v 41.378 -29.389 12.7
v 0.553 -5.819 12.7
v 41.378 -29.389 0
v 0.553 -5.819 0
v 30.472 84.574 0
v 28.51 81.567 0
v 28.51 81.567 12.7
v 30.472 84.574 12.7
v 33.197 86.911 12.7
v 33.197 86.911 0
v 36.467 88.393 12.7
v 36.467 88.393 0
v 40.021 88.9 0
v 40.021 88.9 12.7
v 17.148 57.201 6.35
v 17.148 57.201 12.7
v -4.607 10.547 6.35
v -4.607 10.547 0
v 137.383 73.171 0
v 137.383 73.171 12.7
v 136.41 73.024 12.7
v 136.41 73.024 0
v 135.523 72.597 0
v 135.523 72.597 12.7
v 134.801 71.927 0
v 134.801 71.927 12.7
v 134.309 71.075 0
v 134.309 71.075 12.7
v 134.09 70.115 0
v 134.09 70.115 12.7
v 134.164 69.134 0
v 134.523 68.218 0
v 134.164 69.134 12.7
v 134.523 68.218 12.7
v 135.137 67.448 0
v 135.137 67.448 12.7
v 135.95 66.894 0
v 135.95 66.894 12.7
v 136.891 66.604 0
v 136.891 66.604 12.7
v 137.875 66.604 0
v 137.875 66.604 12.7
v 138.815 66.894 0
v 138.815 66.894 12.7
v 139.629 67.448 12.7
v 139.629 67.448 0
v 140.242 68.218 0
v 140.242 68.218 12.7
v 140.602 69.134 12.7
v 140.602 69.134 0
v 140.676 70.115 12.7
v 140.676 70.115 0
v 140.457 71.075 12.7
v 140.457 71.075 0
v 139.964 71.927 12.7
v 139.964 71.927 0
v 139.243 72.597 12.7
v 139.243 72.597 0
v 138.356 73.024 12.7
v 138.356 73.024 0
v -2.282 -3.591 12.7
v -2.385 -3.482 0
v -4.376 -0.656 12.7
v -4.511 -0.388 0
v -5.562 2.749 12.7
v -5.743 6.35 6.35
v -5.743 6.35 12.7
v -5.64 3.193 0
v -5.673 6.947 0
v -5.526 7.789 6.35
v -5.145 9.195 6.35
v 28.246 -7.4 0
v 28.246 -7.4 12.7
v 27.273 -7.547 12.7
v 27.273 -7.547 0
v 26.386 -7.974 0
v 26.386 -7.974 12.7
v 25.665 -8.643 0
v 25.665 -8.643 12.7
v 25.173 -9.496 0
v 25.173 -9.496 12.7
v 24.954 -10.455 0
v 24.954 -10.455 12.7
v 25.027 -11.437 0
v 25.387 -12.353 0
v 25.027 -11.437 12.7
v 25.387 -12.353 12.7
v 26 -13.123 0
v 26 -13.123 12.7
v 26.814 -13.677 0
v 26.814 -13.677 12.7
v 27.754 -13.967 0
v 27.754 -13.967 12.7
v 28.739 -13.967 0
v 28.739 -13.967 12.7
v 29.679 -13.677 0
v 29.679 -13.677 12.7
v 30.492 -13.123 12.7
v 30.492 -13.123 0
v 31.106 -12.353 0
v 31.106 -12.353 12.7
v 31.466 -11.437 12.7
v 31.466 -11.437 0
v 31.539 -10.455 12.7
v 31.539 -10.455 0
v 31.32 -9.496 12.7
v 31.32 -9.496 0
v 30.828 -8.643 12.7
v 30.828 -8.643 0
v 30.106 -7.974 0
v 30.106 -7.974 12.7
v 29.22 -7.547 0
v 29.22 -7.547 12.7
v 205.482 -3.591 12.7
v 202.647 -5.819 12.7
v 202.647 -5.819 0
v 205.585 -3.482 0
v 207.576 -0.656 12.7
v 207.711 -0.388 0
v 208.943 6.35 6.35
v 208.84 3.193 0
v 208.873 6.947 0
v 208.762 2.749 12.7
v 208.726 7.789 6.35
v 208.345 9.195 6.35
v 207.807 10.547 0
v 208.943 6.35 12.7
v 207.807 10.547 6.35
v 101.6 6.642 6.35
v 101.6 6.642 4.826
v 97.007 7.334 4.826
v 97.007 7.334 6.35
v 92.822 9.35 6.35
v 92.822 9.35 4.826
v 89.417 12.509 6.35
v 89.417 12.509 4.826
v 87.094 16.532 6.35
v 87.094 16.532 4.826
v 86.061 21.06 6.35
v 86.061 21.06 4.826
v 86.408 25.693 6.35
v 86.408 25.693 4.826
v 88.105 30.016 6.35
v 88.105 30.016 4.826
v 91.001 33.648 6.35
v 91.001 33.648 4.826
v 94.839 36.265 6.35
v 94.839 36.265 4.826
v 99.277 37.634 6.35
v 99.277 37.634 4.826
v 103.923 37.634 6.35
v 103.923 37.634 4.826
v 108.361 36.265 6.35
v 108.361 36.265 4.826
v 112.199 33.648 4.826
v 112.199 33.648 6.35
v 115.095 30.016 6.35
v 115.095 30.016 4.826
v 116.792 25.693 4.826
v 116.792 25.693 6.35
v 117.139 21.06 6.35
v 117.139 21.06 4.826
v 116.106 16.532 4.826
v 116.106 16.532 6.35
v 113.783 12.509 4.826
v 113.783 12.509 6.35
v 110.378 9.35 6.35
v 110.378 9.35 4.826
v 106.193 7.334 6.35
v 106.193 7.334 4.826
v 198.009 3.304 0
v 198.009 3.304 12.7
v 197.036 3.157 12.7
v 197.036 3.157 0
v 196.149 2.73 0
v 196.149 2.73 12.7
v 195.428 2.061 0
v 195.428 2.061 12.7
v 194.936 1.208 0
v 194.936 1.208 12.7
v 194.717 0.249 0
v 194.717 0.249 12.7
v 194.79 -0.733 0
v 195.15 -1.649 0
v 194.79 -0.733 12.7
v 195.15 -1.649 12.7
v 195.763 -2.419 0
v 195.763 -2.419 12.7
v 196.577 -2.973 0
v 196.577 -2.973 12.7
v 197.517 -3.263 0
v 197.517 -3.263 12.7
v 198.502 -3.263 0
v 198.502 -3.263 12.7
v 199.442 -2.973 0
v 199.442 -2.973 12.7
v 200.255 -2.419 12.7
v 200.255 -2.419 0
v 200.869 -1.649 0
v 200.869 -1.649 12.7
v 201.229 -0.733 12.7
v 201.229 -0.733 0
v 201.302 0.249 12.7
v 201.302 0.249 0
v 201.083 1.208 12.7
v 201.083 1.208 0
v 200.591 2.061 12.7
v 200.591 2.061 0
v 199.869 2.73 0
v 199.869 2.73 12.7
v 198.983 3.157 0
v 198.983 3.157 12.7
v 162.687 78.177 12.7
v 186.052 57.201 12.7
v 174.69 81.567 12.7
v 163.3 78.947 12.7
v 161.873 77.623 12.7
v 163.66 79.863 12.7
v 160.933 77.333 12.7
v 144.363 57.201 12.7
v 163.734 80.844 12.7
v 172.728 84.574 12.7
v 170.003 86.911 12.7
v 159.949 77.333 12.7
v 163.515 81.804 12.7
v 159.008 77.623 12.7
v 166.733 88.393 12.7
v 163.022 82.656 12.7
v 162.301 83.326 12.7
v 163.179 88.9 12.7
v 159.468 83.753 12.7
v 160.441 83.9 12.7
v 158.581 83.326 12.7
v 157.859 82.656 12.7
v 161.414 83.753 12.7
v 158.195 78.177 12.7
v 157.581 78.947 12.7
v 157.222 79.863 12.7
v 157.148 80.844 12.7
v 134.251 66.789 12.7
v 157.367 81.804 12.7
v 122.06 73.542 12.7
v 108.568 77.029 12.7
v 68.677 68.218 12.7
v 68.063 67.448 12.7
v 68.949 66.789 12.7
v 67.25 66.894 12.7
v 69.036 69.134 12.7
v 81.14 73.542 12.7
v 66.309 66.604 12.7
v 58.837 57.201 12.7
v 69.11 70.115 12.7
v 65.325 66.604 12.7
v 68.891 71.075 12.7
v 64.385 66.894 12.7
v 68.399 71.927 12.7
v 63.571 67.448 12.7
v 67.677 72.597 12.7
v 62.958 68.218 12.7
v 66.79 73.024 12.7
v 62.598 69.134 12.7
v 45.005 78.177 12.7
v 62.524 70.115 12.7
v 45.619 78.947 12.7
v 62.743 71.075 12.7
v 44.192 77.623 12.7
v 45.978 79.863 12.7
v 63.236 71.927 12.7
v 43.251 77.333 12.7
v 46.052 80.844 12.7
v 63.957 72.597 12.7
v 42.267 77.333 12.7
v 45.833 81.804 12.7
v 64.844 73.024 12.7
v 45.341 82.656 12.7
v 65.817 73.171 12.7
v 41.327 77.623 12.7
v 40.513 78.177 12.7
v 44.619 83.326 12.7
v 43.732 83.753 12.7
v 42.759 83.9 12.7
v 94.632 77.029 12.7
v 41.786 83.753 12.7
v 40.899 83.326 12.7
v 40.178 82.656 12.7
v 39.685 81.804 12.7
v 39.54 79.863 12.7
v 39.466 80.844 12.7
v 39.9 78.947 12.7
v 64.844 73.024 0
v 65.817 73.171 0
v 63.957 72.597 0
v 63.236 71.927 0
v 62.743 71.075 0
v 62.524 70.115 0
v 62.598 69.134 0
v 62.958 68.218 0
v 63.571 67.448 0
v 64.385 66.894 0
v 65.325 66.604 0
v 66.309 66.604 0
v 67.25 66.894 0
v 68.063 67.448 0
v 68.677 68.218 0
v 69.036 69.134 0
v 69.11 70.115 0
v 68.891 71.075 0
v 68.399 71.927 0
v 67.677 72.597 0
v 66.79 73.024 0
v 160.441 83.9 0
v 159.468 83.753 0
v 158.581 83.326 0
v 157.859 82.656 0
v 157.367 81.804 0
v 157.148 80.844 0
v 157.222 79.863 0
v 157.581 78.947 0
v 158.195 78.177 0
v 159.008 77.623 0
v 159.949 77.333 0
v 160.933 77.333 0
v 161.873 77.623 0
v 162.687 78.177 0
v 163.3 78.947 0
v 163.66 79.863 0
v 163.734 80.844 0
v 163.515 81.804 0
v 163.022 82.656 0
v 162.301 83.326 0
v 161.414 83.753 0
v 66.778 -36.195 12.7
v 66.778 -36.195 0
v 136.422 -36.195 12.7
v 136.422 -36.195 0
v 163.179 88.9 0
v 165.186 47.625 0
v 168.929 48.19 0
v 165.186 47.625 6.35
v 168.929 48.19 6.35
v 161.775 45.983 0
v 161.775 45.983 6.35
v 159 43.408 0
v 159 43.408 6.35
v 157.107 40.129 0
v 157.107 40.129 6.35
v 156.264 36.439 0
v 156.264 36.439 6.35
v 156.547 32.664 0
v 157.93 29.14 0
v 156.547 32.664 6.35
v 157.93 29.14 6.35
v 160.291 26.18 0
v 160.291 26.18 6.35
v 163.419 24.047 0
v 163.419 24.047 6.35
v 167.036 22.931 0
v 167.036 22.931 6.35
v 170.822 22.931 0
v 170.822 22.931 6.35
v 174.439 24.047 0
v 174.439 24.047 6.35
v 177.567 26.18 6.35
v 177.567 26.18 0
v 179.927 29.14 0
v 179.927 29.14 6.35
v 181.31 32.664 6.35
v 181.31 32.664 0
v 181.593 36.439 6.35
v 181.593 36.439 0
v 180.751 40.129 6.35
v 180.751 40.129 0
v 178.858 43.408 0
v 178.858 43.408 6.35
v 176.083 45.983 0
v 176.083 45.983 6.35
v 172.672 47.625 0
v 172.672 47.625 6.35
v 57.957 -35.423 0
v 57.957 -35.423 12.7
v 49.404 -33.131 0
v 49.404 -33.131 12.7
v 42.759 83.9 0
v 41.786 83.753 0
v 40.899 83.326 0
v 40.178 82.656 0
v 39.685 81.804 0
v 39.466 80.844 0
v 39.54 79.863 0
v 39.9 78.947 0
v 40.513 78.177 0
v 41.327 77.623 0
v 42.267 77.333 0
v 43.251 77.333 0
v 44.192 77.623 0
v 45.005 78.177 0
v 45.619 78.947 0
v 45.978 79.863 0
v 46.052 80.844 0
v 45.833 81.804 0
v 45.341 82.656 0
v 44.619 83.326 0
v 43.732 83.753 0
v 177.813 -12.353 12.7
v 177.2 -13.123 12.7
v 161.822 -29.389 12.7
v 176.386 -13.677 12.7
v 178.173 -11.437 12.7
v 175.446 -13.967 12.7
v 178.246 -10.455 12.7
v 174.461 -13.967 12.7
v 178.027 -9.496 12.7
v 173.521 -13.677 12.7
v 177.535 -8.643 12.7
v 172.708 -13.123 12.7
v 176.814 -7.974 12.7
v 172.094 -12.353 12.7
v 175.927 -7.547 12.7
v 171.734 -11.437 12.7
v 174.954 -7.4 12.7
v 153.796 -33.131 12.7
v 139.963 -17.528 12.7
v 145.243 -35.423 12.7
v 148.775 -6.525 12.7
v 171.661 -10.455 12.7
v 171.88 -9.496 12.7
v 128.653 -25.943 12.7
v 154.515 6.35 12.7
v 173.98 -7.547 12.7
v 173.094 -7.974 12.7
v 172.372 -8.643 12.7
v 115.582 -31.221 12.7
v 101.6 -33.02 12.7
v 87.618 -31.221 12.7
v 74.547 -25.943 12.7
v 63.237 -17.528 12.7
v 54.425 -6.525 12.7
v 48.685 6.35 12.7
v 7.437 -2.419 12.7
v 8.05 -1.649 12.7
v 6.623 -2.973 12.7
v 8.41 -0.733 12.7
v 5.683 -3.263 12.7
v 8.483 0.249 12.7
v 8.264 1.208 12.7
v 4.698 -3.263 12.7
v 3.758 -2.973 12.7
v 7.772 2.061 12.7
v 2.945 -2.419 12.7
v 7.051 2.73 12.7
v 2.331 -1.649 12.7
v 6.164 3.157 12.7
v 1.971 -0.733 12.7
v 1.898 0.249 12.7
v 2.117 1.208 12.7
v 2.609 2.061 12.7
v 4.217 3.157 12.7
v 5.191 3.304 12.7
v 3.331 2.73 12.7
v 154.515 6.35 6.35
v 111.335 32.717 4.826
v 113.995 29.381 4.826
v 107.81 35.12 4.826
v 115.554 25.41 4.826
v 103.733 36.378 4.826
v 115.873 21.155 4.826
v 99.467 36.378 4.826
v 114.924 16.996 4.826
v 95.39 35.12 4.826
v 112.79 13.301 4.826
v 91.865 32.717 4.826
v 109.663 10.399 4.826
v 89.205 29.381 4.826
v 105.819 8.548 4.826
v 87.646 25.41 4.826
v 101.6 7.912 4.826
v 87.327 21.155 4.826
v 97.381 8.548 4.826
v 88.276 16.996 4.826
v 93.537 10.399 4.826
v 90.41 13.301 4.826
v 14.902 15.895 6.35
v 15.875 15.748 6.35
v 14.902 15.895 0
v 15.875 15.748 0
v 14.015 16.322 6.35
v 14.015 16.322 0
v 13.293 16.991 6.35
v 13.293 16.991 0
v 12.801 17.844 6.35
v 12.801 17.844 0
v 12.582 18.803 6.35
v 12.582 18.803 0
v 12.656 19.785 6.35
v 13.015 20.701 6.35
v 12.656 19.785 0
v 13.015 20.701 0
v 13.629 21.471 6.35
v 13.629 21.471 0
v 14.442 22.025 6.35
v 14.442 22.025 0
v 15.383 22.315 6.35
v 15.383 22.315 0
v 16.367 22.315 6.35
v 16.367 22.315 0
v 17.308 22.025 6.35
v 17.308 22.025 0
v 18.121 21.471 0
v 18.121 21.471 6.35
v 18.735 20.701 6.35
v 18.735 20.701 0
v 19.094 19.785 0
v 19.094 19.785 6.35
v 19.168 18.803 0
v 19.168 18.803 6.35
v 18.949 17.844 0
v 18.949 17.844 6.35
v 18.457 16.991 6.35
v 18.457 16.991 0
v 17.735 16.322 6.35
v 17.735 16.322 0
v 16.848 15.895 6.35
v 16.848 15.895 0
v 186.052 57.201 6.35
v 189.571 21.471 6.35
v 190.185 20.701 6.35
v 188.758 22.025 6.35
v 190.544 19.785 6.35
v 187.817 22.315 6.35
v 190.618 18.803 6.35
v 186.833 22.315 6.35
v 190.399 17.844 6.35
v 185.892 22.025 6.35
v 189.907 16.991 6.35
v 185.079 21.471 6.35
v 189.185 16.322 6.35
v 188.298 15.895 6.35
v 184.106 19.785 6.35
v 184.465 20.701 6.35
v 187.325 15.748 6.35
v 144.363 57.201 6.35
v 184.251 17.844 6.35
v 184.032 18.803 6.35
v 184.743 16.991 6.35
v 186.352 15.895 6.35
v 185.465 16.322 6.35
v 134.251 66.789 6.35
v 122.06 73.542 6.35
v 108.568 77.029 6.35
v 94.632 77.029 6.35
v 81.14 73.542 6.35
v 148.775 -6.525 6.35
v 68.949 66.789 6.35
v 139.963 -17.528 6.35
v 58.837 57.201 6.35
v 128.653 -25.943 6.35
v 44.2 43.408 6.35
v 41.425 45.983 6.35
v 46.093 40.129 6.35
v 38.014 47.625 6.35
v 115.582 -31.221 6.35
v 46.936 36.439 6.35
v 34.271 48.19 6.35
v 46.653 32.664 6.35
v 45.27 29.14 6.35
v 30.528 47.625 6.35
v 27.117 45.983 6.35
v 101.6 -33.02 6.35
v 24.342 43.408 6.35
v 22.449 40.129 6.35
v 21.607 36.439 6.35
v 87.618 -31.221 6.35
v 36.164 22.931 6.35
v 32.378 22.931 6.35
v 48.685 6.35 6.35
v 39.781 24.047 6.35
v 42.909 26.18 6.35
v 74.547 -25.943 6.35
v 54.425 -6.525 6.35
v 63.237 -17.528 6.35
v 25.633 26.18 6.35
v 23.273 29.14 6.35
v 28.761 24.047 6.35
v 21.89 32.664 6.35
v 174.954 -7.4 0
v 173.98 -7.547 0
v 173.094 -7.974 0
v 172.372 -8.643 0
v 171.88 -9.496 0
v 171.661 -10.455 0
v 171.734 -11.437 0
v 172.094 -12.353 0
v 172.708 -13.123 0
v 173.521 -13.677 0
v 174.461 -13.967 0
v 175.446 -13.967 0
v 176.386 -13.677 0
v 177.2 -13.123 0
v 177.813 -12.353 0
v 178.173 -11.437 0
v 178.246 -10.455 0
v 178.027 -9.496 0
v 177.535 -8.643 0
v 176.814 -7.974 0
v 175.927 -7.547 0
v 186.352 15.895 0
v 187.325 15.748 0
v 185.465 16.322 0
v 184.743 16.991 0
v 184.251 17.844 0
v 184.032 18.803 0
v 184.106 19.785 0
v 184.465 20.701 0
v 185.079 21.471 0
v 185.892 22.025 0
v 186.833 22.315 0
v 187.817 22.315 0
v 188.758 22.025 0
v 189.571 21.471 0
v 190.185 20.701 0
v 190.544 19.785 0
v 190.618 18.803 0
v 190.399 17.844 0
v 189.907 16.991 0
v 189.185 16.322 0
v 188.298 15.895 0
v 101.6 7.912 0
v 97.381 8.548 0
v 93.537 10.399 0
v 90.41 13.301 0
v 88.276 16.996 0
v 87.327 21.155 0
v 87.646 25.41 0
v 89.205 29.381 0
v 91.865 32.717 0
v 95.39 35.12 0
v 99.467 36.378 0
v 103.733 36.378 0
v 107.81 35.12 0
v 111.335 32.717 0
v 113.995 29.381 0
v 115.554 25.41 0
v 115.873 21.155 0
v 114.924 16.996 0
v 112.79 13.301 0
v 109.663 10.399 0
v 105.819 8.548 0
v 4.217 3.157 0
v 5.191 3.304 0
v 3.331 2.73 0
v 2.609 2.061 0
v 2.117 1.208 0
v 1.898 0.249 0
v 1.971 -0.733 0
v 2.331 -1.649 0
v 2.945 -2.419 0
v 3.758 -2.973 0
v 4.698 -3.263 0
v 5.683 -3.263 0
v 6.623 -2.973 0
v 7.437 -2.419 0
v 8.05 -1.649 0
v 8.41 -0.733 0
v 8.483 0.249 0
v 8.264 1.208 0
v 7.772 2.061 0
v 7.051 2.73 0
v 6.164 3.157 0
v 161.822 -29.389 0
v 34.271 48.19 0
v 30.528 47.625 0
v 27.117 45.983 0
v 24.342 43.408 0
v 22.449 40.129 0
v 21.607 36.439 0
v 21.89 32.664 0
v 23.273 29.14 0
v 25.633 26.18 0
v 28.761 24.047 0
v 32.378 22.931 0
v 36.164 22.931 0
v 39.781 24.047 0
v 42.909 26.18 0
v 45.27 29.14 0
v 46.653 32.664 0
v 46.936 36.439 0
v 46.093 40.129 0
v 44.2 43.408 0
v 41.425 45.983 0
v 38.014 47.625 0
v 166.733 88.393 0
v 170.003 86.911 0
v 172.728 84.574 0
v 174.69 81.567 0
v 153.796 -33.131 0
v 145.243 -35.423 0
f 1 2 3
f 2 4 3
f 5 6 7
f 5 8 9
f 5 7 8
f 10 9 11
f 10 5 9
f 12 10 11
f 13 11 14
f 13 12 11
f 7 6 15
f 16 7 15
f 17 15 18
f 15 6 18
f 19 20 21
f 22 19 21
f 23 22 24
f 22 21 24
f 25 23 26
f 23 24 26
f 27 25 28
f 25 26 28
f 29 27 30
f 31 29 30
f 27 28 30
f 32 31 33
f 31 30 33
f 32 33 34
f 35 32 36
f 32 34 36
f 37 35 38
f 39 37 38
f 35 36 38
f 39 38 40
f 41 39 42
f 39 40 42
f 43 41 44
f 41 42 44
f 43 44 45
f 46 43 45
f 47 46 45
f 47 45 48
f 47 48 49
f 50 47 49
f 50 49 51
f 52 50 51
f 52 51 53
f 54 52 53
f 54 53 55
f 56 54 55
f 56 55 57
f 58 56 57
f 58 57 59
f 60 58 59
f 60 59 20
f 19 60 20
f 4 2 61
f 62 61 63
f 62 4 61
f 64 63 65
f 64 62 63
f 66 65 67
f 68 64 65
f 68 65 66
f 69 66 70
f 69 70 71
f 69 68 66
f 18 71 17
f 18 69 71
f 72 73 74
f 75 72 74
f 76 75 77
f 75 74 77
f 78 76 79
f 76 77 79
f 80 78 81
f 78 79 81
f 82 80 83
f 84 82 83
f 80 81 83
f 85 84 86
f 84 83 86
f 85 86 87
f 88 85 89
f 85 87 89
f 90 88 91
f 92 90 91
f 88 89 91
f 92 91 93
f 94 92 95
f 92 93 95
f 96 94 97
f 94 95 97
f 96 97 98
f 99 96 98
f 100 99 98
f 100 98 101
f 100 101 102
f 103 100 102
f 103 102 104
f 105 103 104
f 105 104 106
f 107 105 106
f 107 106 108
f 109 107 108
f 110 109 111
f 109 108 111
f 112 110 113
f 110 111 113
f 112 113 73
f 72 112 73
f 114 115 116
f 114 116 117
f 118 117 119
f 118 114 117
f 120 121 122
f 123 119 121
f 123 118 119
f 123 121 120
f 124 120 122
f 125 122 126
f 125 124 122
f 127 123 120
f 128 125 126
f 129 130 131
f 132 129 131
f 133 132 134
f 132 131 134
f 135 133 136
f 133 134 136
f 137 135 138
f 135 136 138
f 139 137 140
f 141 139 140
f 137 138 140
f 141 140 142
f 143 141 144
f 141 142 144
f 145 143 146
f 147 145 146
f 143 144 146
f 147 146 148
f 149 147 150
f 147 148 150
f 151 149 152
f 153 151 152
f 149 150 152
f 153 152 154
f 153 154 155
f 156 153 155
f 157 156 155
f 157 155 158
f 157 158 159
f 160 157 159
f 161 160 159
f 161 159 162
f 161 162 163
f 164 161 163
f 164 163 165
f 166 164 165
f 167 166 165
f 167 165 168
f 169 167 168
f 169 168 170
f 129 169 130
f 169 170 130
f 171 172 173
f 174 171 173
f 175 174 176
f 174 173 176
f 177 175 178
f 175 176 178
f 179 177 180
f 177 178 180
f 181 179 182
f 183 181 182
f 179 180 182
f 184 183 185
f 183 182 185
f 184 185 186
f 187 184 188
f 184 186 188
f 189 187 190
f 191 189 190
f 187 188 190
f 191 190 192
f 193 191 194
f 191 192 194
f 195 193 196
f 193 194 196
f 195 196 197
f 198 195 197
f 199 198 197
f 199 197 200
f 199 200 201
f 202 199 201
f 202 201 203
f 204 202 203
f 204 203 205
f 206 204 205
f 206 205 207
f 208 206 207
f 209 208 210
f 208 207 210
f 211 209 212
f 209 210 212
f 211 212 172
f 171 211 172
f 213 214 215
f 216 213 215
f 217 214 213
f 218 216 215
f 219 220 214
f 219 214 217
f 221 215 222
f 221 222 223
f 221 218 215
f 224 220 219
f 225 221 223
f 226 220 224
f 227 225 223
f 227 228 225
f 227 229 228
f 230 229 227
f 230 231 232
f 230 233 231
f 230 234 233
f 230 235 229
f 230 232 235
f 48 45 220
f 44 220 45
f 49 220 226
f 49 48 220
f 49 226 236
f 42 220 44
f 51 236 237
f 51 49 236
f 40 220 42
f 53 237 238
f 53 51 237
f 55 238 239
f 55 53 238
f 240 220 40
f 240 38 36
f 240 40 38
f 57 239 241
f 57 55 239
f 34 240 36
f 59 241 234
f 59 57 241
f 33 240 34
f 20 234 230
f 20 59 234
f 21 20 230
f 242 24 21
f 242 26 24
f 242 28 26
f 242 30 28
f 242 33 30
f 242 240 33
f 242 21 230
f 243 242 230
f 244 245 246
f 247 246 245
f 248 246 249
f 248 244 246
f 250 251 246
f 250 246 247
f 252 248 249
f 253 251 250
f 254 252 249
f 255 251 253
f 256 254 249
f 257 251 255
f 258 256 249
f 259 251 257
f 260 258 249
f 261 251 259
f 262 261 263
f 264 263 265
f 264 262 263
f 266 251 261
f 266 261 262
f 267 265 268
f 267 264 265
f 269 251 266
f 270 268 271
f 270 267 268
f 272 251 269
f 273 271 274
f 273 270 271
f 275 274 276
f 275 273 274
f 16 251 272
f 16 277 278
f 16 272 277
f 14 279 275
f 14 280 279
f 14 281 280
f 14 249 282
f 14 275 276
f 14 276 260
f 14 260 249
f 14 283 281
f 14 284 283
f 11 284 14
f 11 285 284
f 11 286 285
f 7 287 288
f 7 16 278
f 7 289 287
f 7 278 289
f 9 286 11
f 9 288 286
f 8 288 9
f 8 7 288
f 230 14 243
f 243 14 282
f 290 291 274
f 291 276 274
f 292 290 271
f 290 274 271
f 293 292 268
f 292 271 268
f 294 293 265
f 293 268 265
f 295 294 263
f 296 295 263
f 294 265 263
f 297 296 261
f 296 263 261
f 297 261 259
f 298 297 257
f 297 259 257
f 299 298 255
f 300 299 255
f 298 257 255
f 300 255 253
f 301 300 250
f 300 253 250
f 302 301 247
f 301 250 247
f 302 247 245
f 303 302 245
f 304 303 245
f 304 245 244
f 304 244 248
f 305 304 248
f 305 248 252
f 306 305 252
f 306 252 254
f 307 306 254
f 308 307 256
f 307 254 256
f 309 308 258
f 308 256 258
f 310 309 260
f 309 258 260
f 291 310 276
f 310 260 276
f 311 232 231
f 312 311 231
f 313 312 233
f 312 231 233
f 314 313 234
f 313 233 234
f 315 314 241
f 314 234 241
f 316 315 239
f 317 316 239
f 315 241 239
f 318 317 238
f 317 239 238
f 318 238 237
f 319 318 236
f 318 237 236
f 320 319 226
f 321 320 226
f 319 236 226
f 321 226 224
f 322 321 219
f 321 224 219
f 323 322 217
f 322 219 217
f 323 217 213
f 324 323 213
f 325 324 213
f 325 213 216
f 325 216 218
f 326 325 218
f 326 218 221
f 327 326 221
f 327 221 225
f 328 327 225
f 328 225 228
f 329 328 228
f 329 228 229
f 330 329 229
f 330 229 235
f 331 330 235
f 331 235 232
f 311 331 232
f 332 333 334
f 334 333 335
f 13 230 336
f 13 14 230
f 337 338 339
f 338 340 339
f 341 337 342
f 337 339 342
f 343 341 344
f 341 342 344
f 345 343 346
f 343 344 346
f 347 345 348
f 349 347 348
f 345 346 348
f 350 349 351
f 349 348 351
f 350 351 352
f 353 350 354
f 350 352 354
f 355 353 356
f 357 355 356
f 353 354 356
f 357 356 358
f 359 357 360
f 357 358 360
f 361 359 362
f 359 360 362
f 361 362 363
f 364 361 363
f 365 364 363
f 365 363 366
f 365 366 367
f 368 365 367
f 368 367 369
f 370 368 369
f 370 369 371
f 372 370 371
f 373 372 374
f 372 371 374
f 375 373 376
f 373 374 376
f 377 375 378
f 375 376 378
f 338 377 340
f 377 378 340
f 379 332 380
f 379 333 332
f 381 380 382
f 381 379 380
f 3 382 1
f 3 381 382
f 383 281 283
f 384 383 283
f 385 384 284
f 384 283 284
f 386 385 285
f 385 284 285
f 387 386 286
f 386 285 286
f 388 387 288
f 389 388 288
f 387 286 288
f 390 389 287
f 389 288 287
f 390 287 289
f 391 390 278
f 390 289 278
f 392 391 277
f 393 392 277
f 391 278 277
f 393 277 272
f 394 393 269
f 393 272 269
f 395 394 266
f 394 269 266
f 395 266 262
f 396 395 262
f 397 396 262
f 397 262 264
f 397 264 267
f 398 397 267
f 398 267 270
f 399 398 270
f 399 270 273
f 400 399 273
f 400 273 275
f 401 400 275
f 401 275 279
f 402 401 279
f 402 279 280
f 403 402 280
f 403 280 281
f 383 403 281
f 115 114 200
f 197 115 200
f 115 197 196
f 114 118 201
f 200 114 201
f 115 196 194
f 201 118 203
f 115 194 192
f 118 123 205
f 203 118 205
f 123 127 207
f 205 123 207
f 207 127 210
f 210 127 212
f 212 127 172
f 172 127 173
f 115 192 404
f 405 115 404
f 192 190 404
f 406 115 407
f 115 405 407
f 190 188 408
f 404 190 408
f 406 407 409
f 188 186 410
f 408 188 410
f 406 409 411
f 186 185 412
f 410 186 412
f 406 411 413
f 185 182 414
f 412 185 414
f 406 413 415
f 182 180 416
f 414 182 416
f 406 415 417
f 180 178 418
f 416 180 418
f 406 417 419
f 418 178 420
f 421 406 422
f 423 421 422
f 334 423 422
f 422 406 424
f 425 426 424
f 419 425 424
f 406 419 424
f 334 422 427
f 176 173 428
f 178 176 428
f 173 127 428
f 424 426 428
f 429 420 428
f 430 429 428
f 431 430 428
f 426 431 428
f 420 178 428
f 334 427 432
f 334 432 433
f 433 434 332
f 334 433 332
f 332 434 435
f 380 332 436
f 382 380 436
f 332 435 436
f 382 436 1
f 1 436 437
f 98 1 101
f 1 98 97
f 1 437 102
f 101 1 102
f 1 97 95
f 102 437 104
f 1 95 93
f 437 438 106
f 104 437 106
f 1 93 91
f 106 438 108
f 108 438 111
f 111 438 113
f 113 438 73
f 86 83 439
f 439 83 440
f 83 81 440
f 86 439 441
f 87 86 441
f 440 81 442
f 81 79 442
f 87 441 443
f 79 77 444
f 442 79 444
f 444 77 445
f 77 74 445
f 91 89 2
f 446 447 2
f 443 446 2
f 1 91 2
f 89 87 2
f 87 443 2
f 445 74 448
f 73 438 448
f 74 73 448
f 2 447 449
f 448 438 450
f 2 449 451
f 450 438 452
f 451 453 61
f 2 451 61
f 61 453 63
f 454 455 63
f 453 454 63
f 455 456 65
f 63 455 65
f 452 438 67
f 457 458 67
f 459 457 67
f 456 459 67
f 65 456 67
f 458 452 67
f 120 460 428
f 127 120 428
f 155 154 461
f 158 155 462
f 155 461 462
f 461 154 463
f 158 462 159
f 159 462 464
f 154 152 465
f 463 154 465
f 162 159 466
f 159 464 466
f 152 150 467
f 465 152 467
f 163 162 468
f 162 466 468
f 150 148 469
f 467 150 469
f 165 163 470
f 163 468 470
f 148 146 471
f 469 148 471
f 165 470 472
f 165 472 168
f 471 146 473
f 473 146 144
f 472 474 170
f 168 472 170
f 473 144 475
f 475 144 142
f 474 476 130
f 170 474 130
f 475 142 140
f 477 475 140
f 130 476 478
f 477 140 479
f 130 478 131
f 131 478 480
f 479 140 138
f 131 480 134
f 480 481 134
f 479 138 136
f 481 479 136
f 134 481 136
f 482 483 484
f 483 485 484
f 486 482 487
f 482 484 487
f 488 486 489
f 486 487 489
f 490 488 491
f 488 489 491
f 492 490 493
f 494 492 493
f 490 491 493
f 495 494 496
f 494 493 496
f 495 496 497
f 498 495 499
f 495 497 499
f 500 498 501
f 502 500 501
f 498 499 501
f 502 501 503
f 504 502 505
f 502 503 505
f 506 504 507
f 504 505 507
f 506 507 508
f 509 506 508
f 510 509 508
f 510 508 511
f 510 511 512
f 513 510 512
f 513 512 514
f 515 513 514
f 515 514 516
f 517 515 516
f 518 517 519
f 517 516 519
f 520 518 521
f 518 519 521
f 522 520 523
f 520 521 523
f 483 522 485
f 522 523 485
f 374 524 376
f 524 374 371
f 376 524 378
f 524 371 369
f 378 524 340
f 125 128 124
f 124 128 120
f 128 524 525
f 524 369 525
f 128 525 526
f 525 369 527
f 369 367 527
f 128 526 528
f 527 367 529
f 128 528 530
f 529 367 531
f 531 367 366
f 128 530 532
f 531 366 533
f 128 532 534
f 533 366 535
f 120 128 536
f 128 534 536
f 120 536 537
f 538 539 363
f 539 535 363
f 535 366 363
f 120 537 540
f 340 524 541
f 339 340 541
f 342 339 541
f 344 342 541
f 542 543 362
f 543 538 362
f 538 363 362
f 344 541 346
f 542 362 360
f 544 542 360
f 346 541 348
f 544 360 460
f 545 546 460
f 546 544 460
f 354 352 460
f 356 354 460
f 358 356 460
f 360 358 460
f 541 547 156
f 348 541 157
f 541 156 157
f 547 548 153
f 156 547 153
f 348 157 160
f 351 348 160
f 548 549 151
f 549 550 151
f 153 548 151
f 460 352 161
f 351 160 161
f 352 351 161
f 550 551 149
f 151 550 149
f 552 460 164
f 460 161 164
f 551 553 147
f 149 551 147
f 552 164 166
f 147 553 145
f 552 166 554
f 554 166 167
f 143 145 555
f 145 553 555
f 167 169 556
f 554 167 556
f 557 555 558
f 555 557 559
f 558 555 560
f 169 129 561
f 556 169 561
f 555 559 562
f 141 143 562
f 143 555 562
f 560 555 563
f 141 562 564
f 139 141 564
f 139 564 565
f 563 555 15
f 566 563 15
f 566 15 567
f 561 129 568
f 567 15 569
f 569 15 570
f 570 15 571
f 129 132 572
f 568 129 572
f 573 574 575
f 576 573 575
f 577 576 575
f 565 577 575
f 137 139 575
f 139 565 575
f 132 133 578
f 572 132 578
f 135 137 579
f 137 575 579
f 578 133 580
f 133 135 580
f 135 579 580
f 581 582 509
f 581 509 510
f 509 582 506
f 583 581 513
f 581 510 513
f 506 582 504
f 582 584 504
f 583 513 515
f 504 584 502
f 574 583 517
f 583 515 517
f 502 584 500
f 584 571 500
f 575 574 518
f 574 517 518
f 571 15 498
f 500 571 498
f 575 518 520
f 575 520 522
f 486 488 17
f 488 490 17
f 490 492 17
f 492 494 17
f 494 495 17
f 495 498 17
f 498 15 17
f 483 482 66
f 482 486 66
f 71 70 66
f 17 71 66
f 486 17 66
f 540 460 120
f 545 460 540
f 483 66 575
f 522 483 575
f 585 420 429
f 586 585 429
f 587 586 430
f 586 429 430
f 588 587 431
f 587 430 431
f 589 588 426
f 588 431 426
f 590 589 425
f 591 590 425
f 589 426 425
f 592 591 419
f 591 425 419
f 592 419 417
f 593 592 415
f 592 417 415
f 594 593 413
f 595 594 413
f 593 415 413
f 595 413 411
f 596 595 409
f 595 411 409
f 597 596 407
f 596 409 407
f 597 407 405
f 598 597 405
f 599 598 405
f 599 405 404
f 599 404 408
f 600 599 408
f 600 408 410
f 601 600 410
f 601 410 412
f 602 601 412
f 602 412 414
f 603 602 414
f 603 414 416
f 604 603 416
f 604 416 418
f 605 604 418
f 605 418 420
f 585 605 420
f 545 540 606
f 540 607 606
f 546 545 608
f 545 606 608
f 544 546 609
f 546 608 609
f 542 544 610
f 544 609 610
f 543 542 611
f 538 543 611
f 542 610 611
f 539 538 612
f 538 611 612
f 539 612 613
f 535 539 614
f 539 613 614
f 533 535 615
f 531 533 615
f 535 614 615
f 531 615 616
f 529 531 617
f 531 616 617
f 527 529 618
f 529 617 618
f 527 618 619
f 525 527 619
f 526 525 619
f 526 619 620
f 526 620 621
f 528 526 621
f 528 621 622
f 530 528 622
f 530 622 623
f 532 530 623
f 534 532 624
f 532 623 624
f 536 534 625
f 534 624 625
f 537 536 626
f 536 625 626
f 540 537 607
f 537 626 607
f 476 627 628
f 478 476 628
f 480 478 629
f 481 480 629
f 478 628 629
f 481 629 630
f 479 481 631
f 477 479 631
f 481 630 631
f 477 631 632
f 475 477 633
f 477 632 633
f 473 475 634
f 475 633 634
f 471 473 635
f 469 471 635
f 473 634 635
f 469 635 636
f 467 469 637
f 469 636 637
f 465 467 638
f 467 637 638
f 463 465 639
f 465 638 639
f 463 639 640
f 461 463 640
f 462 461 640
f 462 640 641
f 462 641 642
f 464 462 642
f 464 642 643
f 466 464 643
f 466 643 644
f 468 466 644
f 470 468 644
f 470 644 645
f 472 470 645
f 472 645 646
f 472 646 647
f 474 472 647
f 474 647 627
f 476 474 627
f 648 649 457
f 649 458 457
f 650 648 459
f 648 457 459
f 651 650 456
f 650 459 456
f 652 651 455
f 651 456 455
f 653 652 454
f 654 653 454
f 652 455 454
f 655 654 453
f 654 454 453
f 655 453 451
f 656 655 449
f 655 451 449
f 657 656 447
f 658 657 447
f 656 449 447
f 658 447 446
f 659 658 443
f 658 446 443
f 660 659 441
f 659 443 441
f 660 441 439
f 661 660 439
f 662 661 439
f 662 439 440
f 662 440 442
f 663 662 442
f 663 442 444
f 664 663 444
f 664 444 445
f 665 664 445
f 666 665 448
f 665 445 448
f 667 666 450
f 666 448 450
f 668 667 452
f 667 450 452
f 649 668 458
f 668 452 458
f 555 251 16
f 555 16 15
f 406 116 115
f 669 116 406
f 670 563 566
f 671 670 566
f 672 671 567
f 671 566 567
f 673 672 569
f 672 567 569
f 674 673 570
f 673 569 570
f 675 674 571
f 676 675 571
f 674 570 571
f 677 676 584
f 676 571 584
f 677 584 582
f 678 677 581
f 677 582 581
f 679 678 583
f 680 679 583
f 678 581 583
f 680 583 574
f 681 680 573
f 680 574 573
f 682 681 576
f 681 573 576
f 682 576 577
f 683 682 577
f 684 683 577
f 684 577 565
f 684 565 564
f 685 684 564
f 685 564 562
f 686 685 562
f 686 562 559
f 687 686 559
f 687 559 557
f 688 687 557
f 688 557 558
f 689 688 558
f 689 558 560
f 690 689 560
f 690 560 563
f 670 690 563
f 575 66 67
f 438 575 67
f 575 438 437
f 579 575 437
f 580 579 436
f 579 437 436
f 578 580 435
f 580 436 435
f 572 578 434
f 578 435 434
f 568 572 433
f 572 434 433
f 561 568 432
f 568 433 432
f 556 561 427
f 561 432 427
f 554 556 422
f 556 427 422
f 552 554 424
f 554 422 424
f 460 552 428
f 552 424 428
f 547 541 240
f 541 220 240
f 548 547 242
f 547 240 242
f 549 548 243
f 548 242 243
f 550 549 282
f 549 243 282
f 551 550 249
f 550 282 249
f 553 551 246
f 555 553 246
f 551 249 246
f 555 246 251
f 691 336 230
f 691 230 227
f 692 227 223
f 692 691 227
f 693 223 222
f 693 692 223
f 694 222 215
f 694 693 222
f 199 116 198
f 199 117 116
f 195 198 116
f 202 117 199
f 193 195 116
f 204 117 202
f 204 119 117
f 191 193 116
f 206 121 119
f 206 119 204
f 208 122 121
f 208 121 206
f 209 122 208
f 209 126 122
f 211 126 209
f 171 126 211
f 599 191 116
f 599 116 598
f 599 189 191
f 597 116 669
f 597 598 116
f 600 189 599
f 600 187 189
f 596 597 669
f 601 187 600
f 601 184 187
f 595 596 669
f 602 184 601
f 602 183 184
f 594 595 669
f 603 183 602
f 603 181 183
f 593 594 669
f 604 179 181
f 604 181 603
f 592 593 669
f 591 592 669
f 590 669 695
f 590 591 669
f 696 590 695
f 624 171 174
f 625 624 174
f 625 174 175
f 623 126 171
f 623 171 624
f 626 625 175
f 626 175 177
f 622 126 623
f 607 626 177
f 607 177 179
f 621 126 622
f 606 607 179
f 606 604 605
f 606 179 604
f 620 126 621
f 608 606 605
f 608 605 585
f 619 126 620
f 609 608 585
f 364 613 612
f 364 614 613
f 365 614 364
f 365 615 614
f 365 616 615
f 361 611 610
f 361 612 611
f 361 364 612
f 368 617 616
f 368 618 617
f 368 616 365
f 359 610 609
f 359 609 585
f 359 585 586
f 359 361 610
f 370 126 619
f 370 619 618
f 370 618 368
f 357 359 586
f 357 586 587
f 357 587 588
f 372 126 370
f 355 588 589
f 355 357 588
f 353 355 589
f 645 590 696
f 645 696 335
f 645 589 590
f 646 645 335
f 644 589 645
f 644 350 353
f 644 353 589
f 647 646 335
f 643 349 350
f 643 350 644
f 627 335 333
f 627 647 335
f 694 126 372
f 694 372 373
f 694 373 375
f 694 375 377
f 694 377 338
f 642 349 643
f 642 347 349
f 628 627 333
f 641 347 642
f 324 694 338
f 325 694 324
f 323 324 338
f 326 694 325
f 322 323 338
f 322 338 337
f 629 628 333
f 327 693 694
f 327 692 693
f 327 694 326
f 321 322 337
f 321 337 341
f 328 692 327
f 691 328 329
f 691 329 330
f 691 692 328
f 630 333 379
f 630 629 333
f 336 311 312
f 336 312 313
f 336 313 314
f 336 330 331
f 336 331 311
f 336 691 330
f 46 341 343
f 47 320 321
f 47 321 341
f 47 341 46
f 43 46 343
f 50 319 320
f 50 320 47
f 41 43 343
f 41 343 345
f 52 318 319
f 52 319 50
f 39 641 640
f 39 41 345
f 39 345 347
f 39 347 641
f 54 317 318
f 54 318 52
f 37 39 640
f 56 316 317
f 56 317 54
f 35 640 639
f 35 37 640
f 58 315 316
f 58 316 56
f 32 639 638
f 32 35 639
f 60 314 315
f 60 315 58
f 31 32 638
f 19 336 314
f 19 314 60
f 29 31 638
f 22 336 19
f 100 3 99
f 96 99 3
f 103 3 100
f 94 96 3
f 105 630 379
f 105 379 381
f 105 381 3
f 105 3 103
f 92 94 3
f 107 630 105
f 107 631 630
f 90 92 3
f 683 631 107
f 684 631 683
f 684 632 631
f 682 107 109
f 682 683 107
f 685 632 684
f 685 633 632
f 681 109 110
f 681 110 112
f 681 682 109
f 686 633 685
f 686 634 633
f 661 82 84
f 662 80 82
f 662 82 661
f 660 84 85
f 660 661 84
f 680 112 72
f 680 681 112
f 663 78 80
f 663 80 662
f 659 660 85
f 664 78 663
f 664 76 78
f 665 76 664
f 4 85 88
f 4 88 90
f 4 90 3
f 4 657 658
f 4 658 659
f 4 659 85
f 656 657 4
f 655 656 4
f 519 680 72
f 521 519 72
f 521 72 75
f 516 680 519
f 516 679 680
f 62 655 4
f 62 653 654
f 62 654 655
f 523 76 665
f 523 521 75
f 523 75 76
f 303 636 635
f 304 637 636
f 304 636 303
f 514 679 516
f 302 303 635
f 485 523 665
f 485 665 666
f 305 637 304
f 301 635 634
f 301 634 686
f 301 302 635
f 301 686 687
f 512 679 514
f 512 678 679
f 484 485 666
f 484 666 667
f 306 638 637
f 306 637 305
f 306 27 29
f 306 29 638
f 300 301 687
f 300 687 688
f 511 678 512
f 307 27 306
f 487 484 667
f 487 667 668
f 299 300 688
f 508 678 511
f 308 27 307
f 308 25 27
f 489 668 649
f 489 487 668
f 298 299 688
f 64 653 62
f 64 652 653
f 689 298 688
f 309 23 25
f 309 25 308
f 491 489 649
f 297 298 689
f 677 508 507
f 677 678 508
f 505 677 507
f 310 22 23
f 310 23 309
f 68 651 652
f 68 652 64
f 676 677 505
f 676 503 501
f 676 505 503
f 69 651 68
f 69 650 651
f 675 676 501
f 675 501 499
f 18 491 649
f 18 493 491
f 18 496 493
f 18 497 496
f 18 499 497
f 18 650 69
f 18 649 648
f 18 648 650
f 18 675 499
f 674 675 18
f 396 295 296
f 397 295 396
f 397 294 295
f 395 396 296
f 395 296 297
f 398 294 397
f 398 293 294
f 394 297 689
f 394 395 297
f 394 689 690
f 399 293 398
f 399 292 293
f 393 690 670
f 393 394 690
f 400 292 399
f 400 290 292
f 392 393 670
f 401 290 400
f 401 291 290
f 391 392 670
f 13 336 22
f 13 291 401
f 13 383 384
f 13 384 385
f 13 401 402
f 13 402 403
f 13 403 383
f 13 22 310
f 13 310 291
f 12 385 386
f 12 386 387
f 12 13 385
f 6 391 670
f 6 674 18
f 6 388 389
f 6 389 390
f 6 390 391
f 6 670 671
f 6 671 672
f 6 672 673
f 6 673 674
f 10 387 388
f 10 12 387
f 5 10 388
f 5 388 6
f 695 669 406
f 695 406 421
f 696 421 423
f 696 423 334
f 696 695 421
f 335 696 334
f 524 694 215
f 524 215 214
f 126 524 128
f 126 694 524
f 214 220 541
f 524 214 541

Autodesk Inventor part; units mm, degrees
ref_plane "YZ Plane" through (0, 0, 0) normal (1, 0, 0) x (0, 1, 0)
ref_plane "XZ Plane" through (0, 0, 0) normal (0, 1, 0) x (-1, 0, 0)
sketch "Sketch1" plane through (0, 0, 0) normal (0, 0, 1) x (1, 0, 0)
  line L0 (0, 0) -> (0, 63.5)
  line L1 (0, 63.5) -> (203.2, 63.5)
  line L2 (203.2, 63.5) -> (203.2, 0)
  line L3 (0, 0) -> (203.2, 0)
  dimension "d0" = 63.5
  dimension "d1" = 203.2
extrude "Extrusion1" add sketch "Sketch1" along normal blind 12.7
sketch "Sketch2" plane through (0, 0, 12.7) normal (0, 0, 1) x (1, 0, 0)
  line L0 (0, 63.5) -> (0, 0)
  line L1 (203.2, 0) -> (203.2, 63.5)
  line L2 (0, 57.2008) -> (203.2, 57.2008)
  line L3 (203.2, 57.2008) -> (203.2, 6.35)
  line L4 (203.2, 6.35) -> (0, 6.35)
  line L5 (0, 6.35) -> (0, 57.2008)
  line L6 (0, 63.5) -> (203.2, 63.5)
  line L7 (203.2, 0) -> (0, 0)
  dimension "d4" = 6.2992
  dimension "d5" = 6.35
extrude "Extrusion2" cut sketch "Sketch2" against normal blind 6.35 contours L2 L1 L4 L0
sketch "Sketch7" plane through (0, 0, 6.35) normal (0, 0, 1) x (1, 0, 0)
  line L0 (203.2, 6.35) -> (0, 6.35)
  line L1 (203.2, 57.2008) -> (203.2, 6.35)
  point P0 (0, 0)
  point P1 (101.6, 22.225)
  dimension "d19" = 15.875
  dimension "d20" = 101.6
hole "Hole1" at (101.6, 22.225, 6.35) direction (0, 0, -1) diameter 28.6258 end through all counterbore diameter 31.1658 counterbore depth 1.524
sketch "Sketch8" plane through (0, 0, 0) normal (0, 0, -1) x (-1, 0, 0)
  circle A0 centre (-34.2711, 35.4896) radius 17.78
  circle A1 centre (-34.2711, 35.4896) radius 17.78
  circle A2 centre (-34.2711, 35.4896) radius 17.78
  line L0 (-203.2, 63.5) -> (-203.2, 0)
  point P0 (0, 0)
  point P1 (-168.9289, 35.4896)
  dimension "d28" = 34.2711
hole "Hole2" at (168.9289, 35.4896, 0) at (34.2711, 35.4896, 0) direction (0, 0, 1) diameter 25.4 end through all
sketch "Sketch10" plane through (0, 63.5, 0) normal (0, 1, 0) x (1, 0, 0)
  line L0 (0, -12.7) -> (203.2, -12.7)
  line L1 (203.2, -12.7) -> (203.2, 0)
  line L2 (203.2, 0) -> (0, 0)
  line L3 (0, 0) -> (0, -12.7)
  point P0 (0, 0)
extrude "Extrusion5" add sketch "Sketch10" along normal blind 25.4
sketch "Sketch11" plane through (0, 6.35, 6.35) normal (-1, 0, 0) x (0, 0, 1)
  line L0 (0, 50.8508) -> (6.35, 50.8508)
  line L1 (6.35, 50.8508) -> (6.35, 82.55)
  line L2 (-6.35, 82.55) -> (6.35, 82.55)
  line L3 (-6.35, -6.35) -> (-6.35, 82.55)
  line L4 (6.35, 0) -> (6.35, -6.35)
  line L5 (6.35, 0) -> (0, 0)
  line L6 (0, 0) -> (0, 50.8508)
  line L7 (-6.35, -6.35) -> (6.35, -6.35)
extrude "Extrusion6" add sketch "Sketch11" along normal blind 9.525
sketch "Sketch12" plane through (203.2, 6.35, 6.35) normal (1, 0, 0) x (0, 0, -1)
  line L0 (-6.35, 50.8508) -> (0, 50.8508)
  line L1 (0, 50.8508) -> (0, 0)
  line L2 (0, 0) -> (-6.35, 0)
  line L3 (-6.35, -6.35) -> (-6.35, 0)
  line L4 (6.35, 82.55) -> (6.35, -6.35)
  line L5 (-6.35, 82.55) -> (6.35, 82.55)
  line L6 (-6.35, 50.8508) -> (-6.35, 82.55)
  line L7 (6.35, -6.35) -> (-6.35, -6.35)
extrude "Extrusion7" add sketch "Sketch12" along normal blind 9.525
sketch "Sketch15" plane through (0, 0, 0) normal (0, 0, -1) x (-1, 0, 0)
  circle A0 centre (-168.9289, 35.4896) radius 12.7
  circle A1 centre (-34.2711, 35.4896) radius 12.7
  circle A2 centre (-101.6, 22.225) radius 15.5829
  line L0 (9.525, 57.2008) -> (-212.725, 57.2008)
  line L1 (9.525, 6.35) -> (9.525, 57.2008)
  line L2 (-212.725, 6.35) -> (9.525, 6.35)
  line L3 (-212.725, 57.2008) -> (-212.725, 6.35)
  line L4 (9.525, 0) -> (-41.3784, -29.3891)
  circle A3 centre (-168.9289, 35.4896) radius 12.7
  circle A4 centre (-34.2711, 35.4896) radius 12.7
  circle A5 centre (-101.6, 22.225) radius 14.3129
  line L5 (9.525, 88.9) -> (-212.725, 88.9)
  line L6 (-212.725, 0) -> (-212.725, 88.9)
  line L7 (-212.725, 0) -> (9.525, 0)
  line L8 (9.525, 88.9) -> (9.525, 0)
  line L9 (-66.7784, -36.195) -> (-136.4216, -36.195)
  line L10 (-212.725, 0) -> (-161.8216, -29.3891)
  arc A6 (-161.8216, -29.3891) -> (-136.4216, -36.195) centre (-136.4216, 14.605) ccw
  arc A7 (-66.7784, -36.195) -> (-41.3784, -29.3891) centre (-66.7784, 14.605) ccw
  point P0 (0, 0)
  dimension "d45" = 30
  dimension "d46" = 30
  dimension "d47" = 50.8
  dimension "d48" = 58.42
  dimension "d49" = 50.8
extrude "Extrusion9" add sketch "Sketch15" against normal blind 12.7 contours L4 A7 L9 A6 L10 L7
ref_plane "Work Plane1" through (0, 88.9, 12.7) normal (0, 0, 1) x (-1, 0, 0)
sketch "Sketch16" plane through (0, 88.9, 12.7) normal (0, 0, 1) x (-1, 0, 0)
  circle A0 centre (-101.6, 66.675) radius 15.5829
  circle A1 centre (-101.6, 66.675) radius 14.3129
  circle A2 centre (-101.6, 66.675) radius 55.245
  point P0 (0, 88.9)
  dimension "d52" = 110.49
extrude "Extrusion10" cut sketch "Sketch16" against normal blind 6.35 contours A2
fillet "Fillet1" radius 12.7 2 edges at (-9.525, 88.9, 6.35) (212.725, 88.9, 6.35)
sketch "Sketch18" plane through (0, 0, 0) normal (0, 0, -1) x (-1, 0, 0)
  line L0 (55.6789, 19.6749) -> (-24.8919, -17.8959)
  arc A0 (-32.9559, -17.0915) -> (-24.8919, -17.8959) centre (-28.2464, -10.702) ccw
  line L1 (-32.9559, -17.0915) -> (-58.9371, 2.0584)
  arc A1 (-75.7697, 38.156) -> (-58.9371, 2.0584) centre (-34.2596, 35.5391) ccw
  line L2 (-75.7697, 38.156) -> (-73.739, 70.3681)
  arc A2 (-69.1717, 77.0625) -> (-73.739, 70.3681) centre (-65.8172, 69.8687) ccw
  line L3 (-69.1717, 77.0625) -> (11.399, 114.6333)
  arc A3 (21.9474, 110.794) -> (11.399, 114.6333) centre (14.7536, 107.4395) ccw
  line L4 (21.9474, 110.794) -> (59.5181, 30.2233)
  arc A4 (55.6789, 19.6749) -> (59.5181, 30.2233) centre (52.3243, 26.8687) ccw
  circle A5 centre (7.2265, 11.1552) radius 4.7625
  circle A6 centre (14.1519, 58.1138) radius 15.0939
  circle A7 centre (23.7563, 91.8143) radius 4.7625
  line L5 (51.6814, 19.5205) -> (45.6391, 23.7513)
  line L6 (58.3667, 22.6378) -> (51.6814, 19.5205)
  line L7 (59.0096, 29.9861) -> (58.3667, 22.6378)
  line L8 (52.9672, 34.217) -> (59.0096, 29.9861)
  line L9 (46.282, 31.0996) -> (52.9672, 34.217)
  line L10 (45.6391, 23.7513) -> (46.282, 31.0996)
  circle A8 centre (46.1416, 43.8088) radius 4.7625
  circle A9 centre (-34.2596, 35.5391) radius 17.4625
  line L11 (-4.5833, 7.3807) -> (1.459, 3.1498)
  line L12 (-11.2686, 4.2634) -> (-4.5833, 7.3807)
  line L13 (-11.9115, -3.0849) -> (-11.2686, 4.2634)
  line L14 (-5.8691, -7.3158) -> (-11.9115, -3.0849)
  line L15 (0.8161, -4.1984) -> (-5.8691, -7.3158)
  line L16 (1.459, 3.1498) -> (0.8161, -4.1984)
  line L17 (-42.1541, 87.9515) -> (-36.1117, 83.7206)
  line L18 (-48.8393, 84.8341) -> (-42.1541, 87.9515)
  line L19 (-49.4822, 77.4858) -> (-48.8393, 84.8341)
  line L20 (-43.4399, 73.255) -> (-49.4822, 77.4858)
  line L21 (-36.7546, 76.3723) -> (-43.4399, 73.255)
  line L22 (-36.1117, 83.7206) -> (-36.7546, 76.3723)
  line L23 (-27.6035, -3.3538) -> (-21.5612, -7.5847)
  line L24 (-34.2888, -6.4711) -> (-27.6035, -3.3538)
  line L25 (-34.9317, -13.8194) -> (-34.2888, -6.4711)
  line L26 (-28.8893, -18.0503) -> (-34.9317, -13.8194)
  line L27 (-22.2041, -14.9329) -> (-28.8893, -18.0503)
  line L28 (-21.5612, -7.5847) -> (-22.2041, -14.9329)
  line L29 (-65.1743, 77.217) -> (-59.132, 72.9861)
  line L30 (-71.8595, 74.0996) -> (-65.1743, 77.217)
  line L31 (-72.5024, 66.7513) -> (-71.8595, 74.0996)
  line L32 (-66.4601, 62.5204) -> (-72.5024, 66.7513)
  line L33 (-59.7749, 65.6378) -> (-66.4601, 62.5204)
  line L34 (-59.132, 72.9861) -> (-59.7749, 65.6378)
  circle A10 centre (-26.272, 82.993) radius 4.7625
  circle A11 centre (-19.7768, 91.3377) radius 4.064
  line L35 (8.0683, 104.3221) -> (8.7112, 111.6704)
  line L36 (14.1107, 100.0912) -> (8.0683, 104.3221)
  line L37 (20.7959, 103.2086) -> (14.1107, 100.0912)
  line L38 (21.4388, 110.5569) -> (20.7959, 103.2086)
  line L39 (15.3965, 114.7878) -> (21.4388, 110.5569)
  line L40 (8.7112, 111.6704) -> (15.3965, 114.7878)
  circle A12 centre (17.794, 10.767) radius 4.064
  line L41 (-101.6, -72.6306) -> (-101.6, 117.8056)
  line L42 (-212.725, 0) -> (-212.725, 76.2)
  point P0 (0, 0)
  point P1 (-42.7592, 80.5977)
  point P2 (-5.1906, 0.002)
  point P3 (-174.9536, -10.702)
  point P4 (-137.3828, 69.8687)
  point P5 (-160.4408, 80.5977)
  point P6 (-198.0094, 0.002)
  dimension "d56" = 6.35
  dimension "d58" = 7.3787
  dimension "d66" = 111.125
  dimension "d73" = 6.35
  dimension "d75" = 7.3787
hole "Hole3" at (42.7592, 80.5977, 0) at (5.1906, 0.002, 0) at (65.8172, 69.8687, 0) at (28.2464, -10.702, 0) at (160.4408, 80.5977, 0) at (137.3828, 69.8687, 0) at (174.9536, -10.702, 0) at (198.0094, 0.002, 0) direction (0, 0, 1) diameter 6.604 end through all
sketch "Sketch19" plane through (0, 0, 0) normal (0, 0, -1) x (-1, 0, 0)
  line L0 (-235.9962, 172.5258) -> (-132.2749, 172.5258)
  line L1 (-235.9962, -49.9053) -> (-235.9962, 172.5258)
  line L2 (-132.2749, 172.5258) -> (-235.9962, -49.9053)
  line L3 (-101.6, 179.9311) -> (-101.6, -67.571)
  circle A0 centre (-101.6, 22.225) radius 14.3129
  line L4 (32.7962, 172.5258) -> (-70.9251, 172.5258)
  line L5 (32.7962, -49.9053) -> (32.7962, 172.5258)
  line L6 (-70.9251, 172.5258) -> (32.7962, -49.9053)
  point P0 (0, 0)
  point P1 (-212.725, 0)
  dimension "d69" = 25
extrude "Extrusion11" cut sketch "Sketch19" against normal blind 25.4 contours L0 L2 L1 | L5 L6 L4
fillet "Fillet2" radius 12.7 4 edges at (171.2702, 88.9, 6.35) (212.725, 0, 6.35) (-9.525, 0, 6.35) (31.9298, 88.9, 6.35)
sketch "Sketch20" plane through (0, 0, 6.35) normal (0, 0, 1) x (1, 0, 0)
  arc A0 (-4.6068, 10.5471) -> (-5.7427, 6.35) centre (6.9033, 5.1798) ccw
  line L0 (48.685, 6.35) -> (-5.7427, 6.35)
  arc A1 (48.685, 6.35) -> (154.515, 6.35) centre (101.6, 22.225) ccw
  line L1 (208.9427, 6.35) -> (154.515, 6.35)
  arc A2 (208.9427, 6.35) -> (207.8068, 10.5471) centre (196.2967, 5.1798) ccw
  line L2 (207.8068, 10.5471) -> (186.0518, 57.2008)
  line L3 (144.3633, 57.2008) -> (186.0518, 57.2008)
  arc A3 (144.3633, 57.2008) -> (58.8367, 57.2008) centre (101.6, 22.225) ccw
  line L4 (17.1482, 57.2008) -> (58.8367, 57.2008)
  line L5 (17.1482, 57.2008) -> (-4.6068, 10.5471)
  circle A4 centre (34.2711, 35.4896) radius 12.7
  circle A5 centre (101.6, 22.225) radius 15.5829
  circle A6 centre (168.9289, 35.4896) radius 12.7
  circle A7 centre (198.0094, 0.002) radius 3.302
  circle A8 centre (28.2464, -10.702) radius 3.302
  circle A9 centre (5.1906, 0.002) radius 3.302
  circle A10 centre (174.9536, -10.702) radius 3.302
  arc A11 (-5.7427, 6.35) -> (0.5533, -5.8187) centre (6.9033, 5.1798) ccw
  line L6 (0.5533, -5.8187) -> (41.3784, -29.3891)
  arc A12 (41.3784, -29.3891) -> (66.7784, -36.195) centre (66.7784, 14.605) ccw
  line L7 (66.7784, -36.195) -> (136.4216, -36.195)
  arc A13 (136.4216, -36.195) -> (161.8216, -29.3891) centre (136.4216, 14.605) ccw
  line L8 (161.8216, -29.3891) -> (202.6467, -5.8187)
  arc A14 (202.6467, -5.8187) -> (208.9427, 6.35) centre (196.2967, 5.1798) ccw
  line L9 (154.515, 6.35) -> (208.9427, 6.35)
  arc A15 (48.685, 6.35) -> (154.515, 6.35) centre (101.6, 22.225) ccw
  line L10 (-5.7427, 6.35) -> (48.685, 6.35)
  arc A16 (40.0205, 88.9) -> (28.5104, 81.5673) centre (40.0205, 76.2) ccw
  line L11 (28.5104, 81.5673) -> (17.1482, 57.2008)
  line L12 (17.1482, 57.2008) -> (58.8367, 57.2008)
  arc A17 (144.3633, 57.2008) -> (58.8367, 57.2008) centre (101.6, 22.225) ccw
  line L13 (144.3633, 57.2008) -> (186.0518, 57.2008)
  line L14 (186.0518, 57.2008) -> (174.6896, 81.5673)
  arc A18 (174.6896, 81.5673) -> (163.1795, 88.9) centre (163.1795, 76.2) ccw
  line L15 (163.1795, 88.9) -> (40.0205, 88.9)
  circle A19 centre (137.3828, 69.8687) radius 3.302
  circle A20 centre (42.7592, 80.5977) radius 3.302
  circle A21 centre (65.8172, 69.8687) radius 3.302
  circle A22 centre (160.4408, 80.5977) radius 3.302
  point P0 (0, 0)
  point P1 (187.325, 19.05)
  point P2 (15.875, 19.05)
  dimension "d76" = 12.7
  dimension "d77" = 85.725
  dimension "d78" = 85.725
  dimension "d79" = 12.7
hole "Hole4" at (187.325, 19.05, 6.35) at (15.875, 19.05, 6.35) direction (0, 0, -1) diameter 6.604 end through all
sketch "Sketch21" plane through (0, 0, 6.35) normal (0, 0, 1) x (1, 0, 0)
  circle A0 centre (187.325, 19.05) radius 3.302
  circle A1 centre (15.875, 19.05) radius 3.302
  arc A2 (-4.6068, 10.5471) -> (-5.7427, 6.35) centre (6.9033, 5.1798) ccw
  line L0 (48.685, 6.35) -> (-5.7427, 6.35)
  arc A3 (48.685, 6.35) -> (154.515, 6.35) centre (101.6, 22.225) ccw
  line L1 (208.9427, 6.35) -> (154.515, 6.35)
  arc A4 (208.9427, 6.35) -> (207.8068, 10.5471) centre (196.2967, 5.1798) ccw
  line L2 (207.8068, 10.5471) -> (186.0518, 57.2008)
  line L3 (144.3633, 57.2008) -> (186.0518, 57.2008)
  arc A5 (144.3633, 57.2008) -> (58.8367, 57.2008) centre (101.6, 22.225) ccw
  line L4 (17.1482, 57.2008) -> (58.8367, 57.2008)
  line L5 (17.1482, 57.2008) -> (-4.6068, 10.5471)
  circle A6 centre (34.2711, 35.4896) radius 12.7
  circle A7 centre (101.6, 22.225) radius 15.5829
  circle A8 centre (168.9289, 35.4896) radius 12.7
  arc A9 (40.0205, 88.9) -> (28.5104, 81.5673) centre (40.0205, 76.2) ccw
  line L6 (28.5104, 81.5673) -> (17.1482, 57.2008)
  line L7 (17.1482, 57.2008) -> (58.8367, 57.2008)
  arc A10 (144.3633, 57.2008) -> (58.8367, 57.2008) centre (101.6, 22.225) ccw
  line L8 (144.3633, 57.2008) -> (186.0518, 57.2008)
  line L9 (186.0518, 57.2008) -> (174.6896, 81.5673)
  arc A11 (174.6896, 81.5673) -> (163.1795, 88.9) centre (163.1795, 76.2) ccw
  line L10 (163.1795, 88.9) -> (40.0205, 88.9)
  circle A12 centre (137.3828, 69.8687) radius 3.302
  circle A13 centre (42.7592, 80.5977) radius 3.302
  circle A14 centre (65.8172, 69.8687) radius 3.302
  circle A15 centre (160.4408, 80.5977) radius 3.302
  circle A16 centre (198.0094, 0.002) radius 3.302
  circle A17 centre (28.2464, -10.702) radius 3.302
  circle A18 centre (5.1906, 0.002) radius 3.302
  circle A19 centre (174.9536, -10.702) radius 3.302
  arc A20 (-5.7427, 6.35) -> (0.5533, -5.8187) centre (6.9033, 5.1798) ccw
  line L11 (0.5533, -5.8187) -> (41.3784, -29.3891)
  arc A21 (41.3784, -29.3891) -> (66.7784, -36.195) centre (66.7784, 14.605) ccw
  line L12 (66.7784, -36.195) -> (136.4216, -36.195)
  arc A22 (136.4216, -36.195) -> (161.8216, -29.3891) centre (136.4216, 14.605) ccw
  line L13 (161.8216, -29.3891) -> (202.6467, -5.8187)
  arc A23 (202.6467, -5.8187) -> (208.9427, 6.35) centre (196.2967, 5.1798) ccw
  line L14 (154.515, 6.35) -> (208.9427, 6.35)
  arc A24 (48.685, 6.35) -> (154.515, 6.35) centre (101.6, 22.225) ccw
  line L15 (-5.7427, 6.35) -> (48.685, 6.35)
  circle A25 centre (101.6, 22.225) radius 14.3129
  point P0 (0, 0)
properties part number "C11R1_ZP_middle wheel plate" material "Polycarbonate, Clear"
